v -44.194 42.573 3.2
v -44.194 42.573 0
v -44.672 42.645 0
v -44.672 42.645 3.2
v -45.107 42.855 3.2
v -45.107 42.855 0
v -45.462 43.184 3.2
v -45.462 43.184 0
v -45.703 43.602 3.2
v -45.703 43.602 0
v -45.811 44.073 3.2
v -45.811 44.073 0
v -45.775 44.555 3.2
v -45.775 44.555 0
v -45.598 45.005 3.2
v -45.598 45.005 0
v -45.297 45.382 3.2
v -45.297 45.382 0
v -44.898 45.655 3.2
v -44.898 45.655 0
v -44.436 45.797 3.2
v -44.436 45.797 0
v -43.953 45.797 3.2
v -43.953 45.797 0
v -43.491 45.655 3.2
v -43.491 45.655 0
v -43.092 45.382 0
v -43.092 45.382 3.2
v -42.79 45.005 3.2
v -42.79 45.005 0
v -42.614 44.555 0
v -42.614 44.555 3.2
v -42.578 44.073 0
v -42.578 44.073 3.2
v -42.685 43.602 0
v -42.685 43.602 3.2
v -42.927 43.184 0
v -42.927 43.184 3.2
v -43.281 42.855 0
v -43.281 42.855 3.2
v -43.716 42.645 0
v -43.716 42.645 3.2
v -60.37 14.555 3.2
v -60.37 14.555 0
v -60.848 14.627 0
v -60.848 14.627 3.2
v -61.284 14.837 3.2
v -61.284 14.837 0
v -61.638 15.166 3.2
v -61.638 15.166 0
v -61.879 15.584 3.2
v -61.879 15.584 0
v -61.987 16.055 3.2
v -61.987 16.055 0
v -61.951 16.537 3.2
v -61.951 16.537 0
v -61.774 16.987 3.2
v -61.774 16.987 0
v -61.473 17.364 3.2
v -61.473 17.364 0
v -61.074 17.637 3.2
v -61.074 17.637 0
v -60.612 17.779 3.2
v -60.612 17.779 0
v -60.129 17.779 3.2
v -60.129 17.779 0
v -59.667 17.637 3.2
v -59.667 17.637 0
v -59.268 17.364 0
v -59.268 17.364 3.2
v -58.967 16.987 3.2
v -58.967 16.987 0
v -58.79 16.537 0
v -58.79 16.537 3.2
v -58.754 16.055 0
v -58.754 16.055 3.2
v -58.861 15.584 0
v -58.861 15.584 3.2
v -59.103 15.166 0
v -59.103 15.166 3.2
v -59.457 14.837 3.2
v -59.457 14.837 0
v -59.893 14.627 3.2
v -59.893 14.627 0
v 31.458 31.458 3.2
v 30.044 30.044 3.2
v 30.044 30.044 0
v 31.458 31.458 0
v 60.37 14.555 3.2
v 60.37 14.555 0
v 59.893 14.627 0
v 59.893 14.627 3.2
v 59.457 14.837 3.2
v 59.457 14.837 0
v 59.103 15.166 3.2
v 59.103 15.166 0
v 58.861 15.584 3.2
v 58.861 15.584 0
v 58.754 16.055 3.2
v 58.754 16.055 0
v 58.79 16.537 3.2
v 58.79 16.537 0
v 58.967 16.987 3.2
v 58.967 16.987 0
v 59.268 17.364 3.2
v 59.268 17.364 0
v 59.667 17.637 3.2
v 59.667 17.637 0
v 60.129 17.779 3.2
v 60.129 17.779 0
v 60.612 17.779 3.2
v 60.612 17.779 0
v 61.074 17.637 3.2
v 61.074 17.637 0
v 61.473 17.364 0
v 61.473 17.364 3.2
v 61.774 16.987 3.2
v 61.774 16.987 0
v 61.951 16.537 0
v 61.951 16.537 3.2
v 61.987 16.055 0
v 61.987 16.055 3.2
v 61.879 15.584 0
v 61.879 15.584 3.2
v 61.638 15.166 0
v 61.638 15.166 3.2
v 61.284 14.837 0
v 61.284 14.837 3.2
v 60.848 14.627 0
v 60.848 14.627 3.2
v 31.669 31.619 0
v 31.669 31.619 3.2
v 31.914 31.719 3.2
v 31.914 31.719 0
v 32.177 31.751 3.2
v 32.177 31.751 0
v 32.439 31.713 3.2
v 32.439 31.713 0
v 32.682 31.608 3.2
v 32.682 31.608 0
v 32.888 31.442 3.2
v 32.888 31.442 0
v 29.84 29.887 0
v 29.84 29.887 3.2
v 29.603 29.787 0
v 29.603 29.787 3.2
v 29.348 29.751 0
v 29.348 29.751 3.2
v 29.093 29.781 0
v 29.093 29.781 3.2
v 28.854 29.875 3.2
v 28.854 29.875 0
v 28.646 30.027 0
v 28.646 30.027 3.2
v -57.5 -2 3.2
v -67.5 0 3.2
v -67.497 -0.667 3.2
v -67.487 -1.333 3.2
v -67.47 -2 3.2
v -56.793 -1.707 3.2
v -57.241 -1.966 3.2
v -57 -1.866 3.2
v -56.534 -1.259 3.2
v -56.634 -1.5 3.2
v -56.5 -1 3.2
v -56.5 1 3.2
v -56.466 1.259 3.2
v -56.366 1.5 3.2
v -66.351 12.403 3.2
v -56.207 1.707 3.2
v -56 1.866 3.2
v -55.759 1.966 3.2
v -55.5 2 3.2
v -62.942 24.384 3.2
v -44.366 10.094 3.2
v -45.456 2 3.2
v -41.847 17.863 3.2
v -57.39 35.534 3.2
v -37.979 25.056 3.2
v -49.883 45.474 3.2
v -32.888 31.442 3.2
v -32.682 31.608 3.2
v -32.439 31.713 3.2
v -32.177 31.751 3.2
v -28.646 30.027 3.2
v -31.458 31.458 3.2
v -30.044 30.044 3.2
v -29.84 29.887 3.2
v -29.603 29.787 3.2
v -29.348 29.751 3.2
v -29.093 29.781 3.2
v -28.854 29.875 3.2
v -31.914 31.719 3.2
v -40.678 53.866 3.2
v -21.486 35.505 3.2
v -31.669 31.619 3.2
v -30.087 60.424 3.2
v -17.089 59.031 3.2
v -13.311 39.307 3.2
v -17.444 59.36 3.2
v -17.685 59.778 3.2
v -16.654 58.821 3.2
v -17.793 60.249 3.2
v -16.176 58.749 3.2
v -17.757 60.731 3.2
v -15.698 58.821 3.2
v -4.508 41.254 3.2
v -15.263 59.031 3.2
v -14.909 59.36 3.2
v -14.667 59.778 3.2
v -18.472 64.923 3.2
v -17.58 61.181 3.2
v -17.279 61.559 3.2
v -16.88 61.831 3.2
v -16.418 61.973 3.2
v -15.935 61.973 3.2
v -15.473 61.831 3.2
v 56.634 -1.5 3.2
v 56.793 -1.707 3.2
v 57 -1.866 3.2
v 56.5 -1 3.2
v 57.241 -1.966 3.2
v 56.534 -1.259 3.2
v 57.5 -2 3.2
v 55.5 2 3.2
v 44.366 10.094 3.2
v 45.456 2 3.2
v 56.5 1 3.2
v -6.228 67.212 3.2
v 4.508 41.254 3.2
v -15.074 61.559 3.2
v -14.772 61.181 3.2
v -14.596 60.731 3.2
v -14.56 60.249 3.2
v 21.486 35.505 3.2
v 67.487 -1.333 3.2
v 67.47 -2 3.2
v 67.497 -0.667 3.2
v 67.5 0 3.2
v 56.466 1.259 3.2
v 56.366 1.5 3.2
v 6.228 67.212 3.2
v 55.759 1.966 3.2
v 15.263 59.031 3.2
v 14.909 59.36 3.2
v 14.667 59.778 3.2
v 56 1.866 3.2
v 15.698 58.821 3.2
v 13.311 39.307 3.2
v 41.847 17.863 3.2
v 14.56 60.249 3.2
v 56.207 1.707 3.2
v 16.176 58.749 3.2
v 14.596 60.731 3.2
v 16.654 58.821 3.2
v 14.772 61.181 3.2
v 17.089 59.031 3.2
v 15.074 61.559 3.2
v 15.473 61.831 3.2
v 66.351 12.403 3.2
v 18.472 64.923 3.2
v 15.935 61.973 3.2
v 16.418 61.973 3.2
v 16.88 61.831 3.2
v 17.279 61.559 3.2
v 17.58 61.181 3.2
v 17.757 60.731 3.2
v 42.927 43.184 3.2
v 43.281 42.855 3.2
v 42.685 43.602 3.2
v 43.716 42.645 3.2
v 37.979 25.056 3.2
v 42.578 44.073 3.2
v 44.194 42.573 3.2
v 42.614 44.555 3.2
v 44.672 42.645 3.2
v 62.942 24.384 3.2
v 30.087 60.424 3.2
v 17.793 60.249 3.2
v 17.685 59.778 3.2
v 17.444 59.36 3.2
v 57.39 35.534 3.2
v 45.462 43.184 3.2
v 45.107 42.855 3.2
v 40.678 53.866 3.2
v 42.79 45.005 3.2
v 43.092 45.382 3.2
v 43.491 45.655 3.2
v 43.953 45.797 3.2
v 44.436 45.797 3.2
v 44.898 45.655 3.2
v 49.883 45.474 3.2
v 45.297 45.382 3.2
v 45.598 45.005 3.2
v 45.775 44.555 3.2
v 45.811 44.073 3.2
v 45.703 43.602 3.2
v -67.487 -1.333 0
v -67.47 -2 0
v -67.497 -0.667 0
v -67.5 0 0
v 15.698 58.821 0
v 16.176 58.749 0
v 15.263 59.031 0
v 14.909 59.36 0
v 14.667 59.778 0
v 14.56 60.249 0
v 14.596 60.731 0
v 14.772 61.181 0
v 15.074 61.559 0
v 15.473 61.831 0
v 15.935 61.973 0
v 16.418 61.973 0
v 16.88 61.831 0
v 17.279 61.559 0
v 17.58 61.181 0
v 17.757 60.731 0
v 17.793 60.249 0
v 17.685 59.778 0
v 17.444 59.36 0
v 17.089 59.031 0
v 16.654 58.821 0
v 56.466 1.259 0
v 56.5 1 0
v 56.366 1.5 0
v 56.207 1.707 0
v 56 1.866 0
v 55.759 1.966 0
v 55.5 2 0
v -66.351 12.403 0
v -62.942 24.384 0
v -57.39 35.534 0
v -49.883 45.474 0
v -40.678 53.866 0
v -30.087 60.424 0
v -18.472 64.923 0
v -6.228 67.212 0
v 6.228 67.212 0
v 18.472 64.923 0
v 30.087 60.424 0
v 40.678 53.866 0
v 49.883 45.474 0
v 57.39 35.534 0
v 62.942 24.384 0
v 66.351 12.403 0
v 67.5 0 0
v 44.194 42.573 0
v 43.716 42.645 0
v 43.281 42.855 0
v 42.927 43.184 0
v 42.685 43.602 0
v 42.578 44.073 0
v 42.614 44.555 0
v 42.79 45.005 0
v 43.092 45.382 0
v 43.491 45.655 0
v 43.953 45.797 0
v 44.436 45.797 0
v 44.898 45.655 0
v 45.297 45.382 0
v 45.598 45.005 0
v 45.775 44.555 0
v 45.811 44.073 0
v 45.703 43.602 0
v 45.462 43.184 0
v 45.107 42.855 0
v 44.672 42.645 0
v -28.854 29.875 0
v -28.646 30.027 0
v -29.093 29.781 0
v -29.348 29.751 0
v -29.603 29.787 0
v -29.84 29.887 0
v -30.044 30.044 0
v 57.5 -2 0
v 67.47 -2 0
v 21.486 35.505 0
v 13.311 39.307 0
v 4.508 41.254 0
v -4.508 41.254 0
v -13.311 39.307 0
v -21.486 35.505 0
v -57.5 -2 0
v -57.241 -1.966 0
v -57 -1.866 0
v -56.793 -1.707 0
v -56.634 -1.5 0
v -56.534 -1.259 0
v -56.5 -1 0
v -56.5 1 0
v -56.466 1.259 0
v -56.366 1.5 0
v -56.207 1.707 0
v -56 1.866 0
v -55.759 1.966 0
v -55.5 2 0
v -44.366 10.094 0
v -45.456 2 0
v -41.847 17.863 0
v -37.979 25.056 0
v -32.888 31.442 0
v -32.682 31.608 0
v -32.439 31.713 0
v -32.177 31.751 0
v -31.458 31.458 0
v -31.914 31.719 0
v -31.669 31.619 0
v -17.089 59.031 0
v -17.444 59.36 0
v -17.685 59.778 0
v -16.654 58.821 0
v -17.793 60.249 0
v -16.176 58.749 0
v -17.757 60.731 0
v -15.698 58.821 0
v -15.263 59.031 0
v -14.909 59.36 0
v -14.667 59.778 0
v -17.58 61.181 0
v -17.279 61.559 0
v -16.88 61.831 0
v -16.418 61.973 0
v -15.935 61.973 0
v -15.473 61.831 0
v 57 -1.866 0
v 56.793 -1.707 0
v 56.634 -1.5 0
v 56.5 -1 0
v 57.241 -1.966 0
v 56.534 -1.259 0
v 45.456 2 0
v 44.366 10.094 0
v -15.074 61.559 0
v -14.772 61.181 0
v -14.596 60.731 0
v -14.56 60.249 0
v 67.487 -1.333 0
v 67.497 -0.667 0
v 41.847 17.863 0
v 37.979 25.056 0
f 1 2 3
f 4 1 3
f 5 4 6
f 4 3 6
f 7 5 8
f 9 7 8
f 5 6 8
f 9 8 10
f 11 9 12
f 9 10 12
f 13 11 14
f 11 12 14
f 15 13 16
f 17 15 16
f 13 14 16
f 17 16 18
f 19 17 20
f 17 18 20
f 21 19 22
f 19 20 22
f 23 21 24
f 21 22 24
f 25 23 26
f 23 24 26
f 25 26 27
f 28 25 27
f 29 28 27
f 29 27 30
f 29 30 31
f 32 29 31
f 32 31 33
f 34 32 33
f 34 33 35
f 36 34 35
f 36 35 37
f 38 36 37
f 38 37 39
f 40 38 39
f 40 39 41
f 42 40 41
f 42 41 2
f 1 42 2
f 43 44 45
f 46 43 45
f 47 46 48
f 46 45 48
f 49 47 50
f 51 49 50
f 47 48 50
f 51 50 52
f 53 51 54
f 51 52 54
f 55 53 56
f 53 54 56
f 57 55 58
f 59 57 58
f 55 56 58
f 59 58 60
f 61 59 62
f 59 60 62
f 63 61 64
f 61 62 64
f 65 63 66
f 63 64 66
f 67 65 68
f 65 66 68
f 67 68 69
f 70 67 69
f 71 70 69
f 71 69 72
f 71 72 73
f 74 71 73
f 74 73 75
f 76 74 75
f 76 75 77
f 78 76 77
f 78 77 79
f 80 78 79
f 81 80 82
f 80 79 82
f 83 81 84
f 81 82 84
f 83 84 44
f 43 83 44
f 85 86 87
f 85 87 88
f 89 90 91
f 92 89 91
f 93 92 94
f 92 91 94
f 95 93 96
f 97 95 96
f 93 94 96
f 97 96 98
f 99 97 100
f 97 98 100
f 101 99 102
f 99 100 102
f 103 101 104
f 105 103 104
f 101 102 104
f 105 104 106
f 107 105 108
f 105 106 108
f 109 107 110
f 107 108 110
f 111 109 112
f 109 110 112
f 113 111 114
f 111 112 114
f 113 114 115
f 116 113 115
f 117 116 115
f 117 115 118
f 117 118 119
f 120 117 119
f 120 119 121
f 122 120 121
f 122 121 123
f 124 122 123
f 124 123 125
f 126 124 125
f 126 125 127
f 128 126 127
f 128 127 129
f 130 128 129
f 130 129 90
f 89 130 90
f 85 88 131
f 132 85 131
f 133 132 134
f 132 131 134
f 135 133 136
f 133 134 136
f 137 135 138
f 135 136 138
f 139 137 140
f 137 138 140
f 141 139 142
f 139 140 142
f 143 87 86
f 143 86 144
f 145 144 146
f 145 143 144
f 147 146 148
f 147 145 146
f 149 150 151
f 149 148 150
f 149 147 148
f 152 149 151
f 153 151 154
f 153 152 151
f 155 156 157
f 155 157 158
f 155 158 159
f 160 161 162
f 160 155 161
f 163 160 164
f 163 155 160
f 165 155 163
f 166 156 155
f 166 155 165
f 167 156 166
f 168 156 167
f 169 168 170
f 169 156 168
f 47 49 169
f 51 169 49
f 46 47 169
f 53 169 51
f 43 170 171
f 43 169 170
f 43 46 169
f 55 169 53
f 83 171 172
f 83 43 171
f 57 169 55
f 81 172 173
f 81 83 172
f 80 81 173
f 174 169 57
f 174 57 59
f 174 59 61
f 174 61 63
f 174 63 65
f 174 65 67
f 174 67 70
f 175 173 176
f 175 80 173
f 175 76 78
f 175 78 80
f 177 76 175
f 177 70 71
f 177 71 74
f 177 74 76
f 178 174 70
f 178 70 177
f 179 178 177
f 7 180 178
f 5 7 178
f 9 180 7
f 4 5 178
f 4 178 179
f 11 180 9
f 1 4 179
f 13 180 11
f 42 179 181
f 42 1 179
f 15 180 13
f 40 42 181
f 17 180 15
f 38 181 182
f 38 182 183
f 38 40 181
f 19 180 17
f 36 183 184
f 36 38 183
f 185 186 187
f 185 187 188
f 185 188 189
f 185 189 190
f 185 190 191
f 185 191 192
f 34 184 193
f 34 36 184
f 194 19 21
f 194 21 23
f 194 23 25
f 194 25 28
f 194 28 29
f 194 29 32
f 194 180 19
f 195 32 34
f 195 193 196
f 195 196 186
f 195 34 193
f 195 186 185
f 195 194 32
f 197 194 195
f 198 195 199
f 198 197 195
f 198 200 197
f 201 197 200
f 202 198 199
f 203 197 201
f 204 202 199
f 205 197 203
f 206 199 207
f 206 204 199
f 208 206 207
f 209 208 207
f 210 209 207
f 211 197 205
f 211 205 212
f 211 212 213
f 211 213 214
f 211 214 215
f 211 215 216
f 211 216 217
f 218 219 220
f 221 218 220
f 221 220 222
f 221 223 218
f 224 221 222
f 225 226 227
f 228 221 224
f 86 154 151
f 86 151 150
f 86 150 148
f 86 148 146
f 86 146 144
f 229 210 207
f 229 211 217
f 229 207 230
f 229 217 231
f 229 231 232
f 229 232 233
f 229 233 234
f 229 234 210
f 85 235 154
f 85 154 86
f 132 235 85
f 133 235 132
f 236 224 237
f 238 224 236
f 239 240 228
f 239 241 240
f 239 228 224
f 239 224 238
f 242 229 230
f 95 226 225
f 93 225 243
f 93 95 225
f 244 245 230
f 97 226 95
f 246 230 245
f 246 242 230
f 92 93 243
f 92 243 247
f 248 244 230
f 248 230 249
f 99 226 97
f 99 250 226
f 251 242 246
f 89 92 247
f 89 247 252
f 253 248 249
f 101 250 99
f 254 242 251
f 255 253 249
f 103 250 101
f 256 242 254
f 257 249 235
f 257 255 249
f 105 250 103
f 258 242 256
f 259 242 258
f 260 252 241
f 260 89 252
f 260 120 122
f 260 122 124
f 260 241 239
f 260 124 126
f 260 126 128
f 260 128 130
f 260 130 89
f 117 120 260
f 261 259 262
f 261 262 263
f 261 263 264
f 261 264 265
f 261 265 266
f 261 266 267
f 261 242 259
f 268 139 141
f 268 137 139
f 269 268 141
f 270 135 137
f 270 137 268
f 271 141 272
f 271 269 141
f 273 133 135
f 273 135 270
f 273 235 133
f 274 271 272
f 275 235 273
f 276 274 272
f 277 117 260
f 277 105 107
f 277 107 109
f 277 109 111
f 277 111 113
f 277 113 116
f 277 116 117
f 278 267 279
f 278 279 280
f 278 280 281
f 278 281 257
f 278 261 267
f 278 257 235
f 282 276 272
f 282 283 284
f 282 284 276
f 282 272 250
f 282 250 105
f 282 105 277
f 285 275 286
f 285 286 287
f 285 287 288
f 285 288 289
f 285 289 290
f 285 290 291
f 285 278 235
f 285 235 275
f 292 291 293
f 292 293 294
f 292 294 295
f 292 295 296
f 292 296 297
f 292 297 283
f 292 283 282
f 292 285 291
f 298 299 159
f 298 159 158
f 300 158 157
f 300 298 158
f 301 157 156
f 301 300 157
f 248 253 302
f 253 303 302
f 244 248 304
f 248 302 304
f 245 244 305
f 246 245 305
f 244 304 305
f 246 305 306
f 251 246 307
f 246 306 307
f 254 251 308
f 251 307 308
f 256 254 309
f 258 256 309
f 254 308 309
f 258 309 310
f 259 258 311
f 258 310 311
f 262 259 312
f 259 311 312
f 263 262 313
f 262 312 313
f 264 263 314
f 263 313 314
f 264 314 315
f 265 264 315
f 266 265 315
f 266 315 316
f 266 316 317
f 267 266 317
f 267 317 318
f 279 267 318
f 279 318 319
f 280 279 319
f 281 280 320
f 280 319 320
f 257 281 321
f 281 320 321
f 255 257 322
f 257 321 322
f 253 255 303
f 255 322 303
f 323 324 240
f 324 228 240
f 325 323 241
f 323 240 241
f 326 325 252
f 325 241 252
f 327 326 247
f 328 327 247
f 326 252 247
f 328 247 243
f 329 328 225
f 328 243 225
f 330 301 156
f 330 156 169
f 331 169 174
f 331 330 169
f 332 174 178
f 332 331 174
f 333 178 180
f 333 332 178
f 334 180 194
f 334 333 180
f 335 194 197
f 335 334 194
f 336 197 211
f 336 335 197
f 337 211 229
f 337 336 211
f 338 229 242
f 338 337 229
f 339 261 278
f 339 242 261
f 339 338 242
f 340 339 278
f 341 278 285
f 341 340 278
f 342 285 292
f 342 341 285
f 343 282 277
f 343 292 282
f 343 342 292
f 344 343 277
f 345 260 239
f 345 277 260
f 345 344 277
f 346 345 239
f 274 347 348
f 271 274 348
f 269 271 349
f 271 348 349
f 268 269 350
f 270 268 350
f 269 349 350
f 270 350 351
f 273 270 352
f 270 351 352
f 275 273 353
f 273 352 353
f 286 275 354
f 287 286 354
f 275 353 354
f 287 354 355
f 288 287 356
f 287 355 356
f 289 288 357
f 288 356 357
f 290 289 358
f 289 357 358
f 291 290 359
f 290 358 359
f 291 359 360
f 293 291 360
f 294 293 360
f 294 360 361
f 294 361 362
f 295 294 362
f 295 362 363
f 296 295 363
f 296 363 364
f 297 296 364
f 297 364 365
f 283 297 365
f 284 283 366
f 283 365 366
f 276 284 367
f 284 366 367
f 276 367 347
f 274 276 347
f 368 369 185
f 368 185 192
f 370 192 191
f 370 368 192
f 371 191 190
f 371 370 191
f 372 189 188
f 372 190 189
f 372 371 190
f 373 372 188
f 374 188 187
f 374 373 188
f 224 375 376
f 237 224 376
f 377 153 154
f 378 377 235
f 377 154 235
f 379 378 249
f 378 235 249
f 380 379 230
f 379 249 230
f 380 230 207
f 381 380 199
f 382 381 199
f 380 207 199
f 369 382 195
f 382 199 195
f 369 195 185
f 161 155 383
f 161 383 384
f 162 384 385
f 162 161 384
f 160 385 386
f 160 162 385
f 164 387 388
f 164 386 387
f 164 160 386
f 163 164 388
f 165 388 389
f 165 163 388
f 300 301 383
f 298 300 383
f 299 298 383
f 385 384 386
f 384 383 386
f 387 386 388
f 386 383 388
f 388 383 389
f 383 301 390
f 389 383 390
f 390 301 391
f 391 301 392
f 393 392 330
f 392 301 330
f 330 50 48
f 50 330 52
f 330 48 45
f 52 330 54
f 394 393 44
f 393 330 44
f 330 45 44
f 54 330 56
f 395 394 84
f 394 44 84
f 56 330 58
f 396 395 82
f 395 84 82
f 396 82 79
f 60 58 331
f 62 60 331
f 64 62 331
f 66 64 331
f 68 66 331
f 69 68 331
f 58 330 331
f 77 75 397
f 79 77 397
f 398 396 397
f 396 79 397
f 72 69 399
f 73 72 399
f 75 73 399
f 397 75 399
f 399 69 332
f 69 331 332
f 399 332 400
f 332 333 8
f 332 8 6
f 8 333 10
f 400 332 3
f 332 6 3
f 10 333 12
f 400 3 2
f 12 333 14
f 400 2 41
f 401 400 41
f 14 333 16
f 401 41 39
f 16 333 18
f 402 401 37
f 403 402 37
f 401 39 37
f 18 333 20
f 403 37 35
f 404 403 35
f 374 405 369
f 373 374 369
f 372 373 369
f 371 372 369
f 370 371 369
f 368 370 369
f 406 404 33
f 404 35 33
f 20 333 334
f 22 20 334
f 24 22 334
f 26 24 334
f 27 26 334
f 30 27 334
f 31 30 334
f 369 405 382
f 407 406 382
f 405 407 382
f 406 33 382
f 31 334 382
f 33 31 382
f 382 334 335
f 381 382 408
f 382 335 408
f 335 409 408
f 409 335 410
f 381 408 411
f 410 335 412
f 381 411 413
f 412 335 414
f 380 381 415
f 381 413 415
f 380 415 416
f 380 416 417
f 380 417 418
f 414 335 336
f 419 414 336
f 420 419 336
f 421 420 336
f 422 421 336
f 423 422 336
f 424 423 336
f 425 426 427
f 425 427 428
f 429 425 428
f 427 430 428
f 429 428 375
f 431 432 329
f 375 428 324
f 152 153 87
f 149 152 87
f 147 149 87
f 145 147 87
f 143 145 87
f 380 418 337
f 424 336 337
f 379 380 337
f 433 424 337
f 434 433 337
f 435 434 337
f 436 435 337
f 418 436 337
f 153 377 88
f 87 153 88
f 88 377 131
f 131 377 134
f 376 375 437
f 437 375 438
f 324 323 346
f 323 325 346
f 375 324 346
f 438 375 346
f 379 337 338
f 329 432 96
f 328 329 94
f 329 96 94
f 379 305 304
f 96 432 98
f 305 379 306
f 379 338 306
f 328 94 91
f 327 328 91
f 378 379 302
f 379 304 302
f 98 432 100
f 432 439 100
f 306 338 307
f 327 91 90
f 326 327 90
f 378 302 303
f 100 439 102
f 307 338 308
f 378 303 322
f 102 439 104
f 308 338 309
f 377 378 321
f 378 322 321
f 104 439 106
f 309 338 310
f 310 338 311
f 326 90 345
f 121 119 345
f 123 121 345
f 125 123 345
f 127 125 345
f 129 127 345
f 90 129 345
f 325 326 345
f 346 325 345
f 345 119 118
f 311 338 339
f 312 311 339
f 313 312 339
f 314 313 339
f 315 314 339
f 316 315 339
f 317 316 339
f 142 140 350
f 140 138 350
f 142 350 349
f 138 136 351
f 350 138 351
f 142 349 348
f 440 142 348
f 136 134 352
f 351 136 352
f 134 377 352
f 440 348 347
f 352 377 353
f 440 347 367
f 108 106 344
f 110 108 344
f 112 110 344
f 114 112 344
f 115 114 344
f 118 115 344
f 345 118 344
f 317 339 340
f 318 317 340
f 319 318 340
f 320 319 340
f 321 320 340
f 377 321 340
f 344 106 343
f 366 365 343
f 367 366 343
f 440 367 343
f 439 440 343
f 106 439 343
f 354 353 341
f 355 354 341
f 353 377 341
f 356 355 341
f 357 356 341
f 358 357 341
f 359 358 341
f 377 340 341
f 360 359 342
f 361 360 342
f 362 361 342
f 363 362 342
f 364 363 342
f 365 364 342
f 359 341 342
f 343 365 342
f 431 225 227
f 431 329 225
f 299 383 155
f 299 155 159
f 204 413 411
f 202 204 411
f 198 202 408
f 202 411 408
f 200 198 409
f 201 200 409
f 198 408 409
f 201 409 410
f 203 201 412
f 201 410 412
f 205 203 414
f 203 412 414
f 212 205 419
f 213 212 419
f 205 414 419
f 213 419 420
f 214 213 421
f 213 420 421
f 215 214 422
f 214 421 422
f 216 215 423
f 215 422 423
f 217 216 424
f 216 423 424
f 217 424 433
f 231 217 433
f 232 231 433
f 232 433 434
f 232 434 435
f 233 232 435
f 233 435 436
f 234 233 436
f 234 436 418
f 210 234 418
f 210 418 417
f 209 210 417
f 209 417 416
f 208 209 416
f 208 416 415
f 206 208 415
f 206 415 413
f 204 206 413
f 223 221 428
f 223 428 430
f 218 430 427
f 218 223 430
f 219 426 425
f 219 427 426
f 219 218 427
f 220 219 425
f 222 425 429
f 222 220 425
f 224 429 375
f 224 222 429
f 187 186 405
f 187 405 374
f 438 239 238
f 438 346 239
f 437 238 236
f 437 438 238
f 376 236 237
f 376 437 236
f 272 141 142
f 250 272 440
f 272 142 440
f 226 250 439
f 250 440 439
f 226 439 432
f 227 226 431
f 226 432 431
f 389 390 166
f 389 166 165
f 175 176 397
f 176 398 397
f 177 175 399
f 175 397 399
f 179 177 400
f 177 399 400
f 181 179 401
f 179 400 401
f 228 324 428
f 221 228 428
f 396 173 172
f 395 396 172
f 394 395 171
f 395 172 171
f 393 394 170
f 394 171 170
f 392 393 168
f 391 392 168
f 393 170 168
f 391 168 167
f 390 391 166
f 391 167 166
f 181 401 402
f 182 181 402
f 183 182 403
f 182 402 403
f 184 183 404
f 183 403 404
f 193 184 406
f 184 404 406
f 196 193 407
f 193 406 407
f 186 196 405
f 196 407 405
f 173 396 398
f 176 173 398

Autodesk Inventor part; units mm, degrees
ref_plane "YZ Plane" through (0, 0, 0) normal (1, 0, 0) x (0, 1, 0)
ref_plane "XZ Plane" through (0, 0, 0) normal (0, 1, 0) x (-1, 0, 0)
ref_plane "XY Plane" through (0, 0, 0) normal (0, 0, 1) x (1, 0, 0)
sketch "スケッチ5" plane through (0, 0, 3.2) normal (0, 0, 1) x (1, 0, 0)
  circle A0 centre (-16.1762, 60.3704) radius 1.621 projected
  circle A1 centre (16.1762, 60.3704) radius 1.621 projected
  arc A2 (67.5, 0) -> (-67.5, 0) centre (0, 0) ccw projected
  circle A3 centre (-16.1762, 60.3704) radius 5
  circle A4 centre (16.1762, 60.3704) radius 5
  circle A5 centre (-44.1942, 44.1942) radius 1.621 projected
  circle A6 centre (-60.3704, 16.1762) radius 1.621 projected
  circle A7 centre (44.1942, 44.1942) radius 1.621 projected
  circle A8 centre (60.3704, 16.1762) radius 1.621 projected
  arc A9 (62.5, 0) -> (-62.5, 0) centre (0, 0) ccw
  circle A10 centre (-44.1942, 44.1942) radius 5
  circle A11 centre (-60.3704, 16.1762) radius 5
  circle A12 centre (44.1942, 44.1942) radius 5
  circle A13 centre (60.3704, 16.1762) radius 5
  line L0 (-45.5, 0) -> (-67.5, 0) projected
  line L1 (67.5, 0) -> (45.5, 0) projected
  point P0 (17.4703, 65.2)
  point P1 (-17.4703, 65.2)
  point P2 (58.8841, 20.9502)
  point P3 (65.2, 17.4703)
  point P4 (47.7297, 47.7297)
  point P5 (47.5855, 40.52)
  point P6 (40.52, 47.5855)
  point P7 (20.9502, 58.8841)
  point P8 (-65.2, 17.4703)
  point P9 (-58.8841, 20.9502)
  point P10 (-47.5855, 40.52)
  point P11 (-47.7297, 47.7297)
  point P12 (-40.52, 47.5855)
  point P13 (-20.9502, 58.8841)
  point P14 (-11.2987, 61.4702)
  point P15 (11.2987, 61.4702)
  point P16 (61.4702, 11.2987)
  point P17 (-61.4702, 11.2987)
sketch "スケッチ1" plane through (0, 0, 0) normal (0, 0, 1) x (1, 0, 0)
  arc A0 (45.456, 2) -> (-45.5, 0) centre (0, 0) ccw
  arc A1 (67.5, 0) -> (-67.5, 0) centre (0, 0) ccw
  arc A2 (67.4704, -2) -> (-67.4704, -2) centre (0, 0) ccw
  arc A3 (45.456, 2) -> (-45.456, 2) centre (0, 0) ccw
  line L0 (-56.5, 2) -> (-56.5, -2)
  line L1 (-56.5, 2) -> (-45.456, 2)
  line L2 (-56.5, -2) -> (-67.4704, -2)
  line L3 (0, 81.4) -> (0, -15.9)
  line L4 (56.5, 2) -> (56.5, -2)
  line L5 (56.5, 2) -> (45.456, 2)
  line L6 (56.5, -2) -> (67.4704, -2)
  line L7 (-45.5, 0) -> (0, 0)
  point P0 (44.5, 0)
  point P1 (45.5, 0)
  dimension "d0" = 91
  dimension "d1" = 135
  dimension "d58" = 11
  dimension "d61" = 2
  dimension "d62" = 2
extrude "プレート2" add sketch "スケッチ1" along normal blind 3.2 contours L1 L0 L2 A2 A1 L3 A0 | L3 A1 A2 L6 L4 L5 A0
sketch "スケッチ2" plane through (0, 0, 3.2) normal (0, 0, 1) x (1, 0, 0)
  circle A0 centre (0, 0) radius 62.5
  point P0 (16.1762, 60.3704)
  point P1 (-16.1762, 60.3704)
  point P2 (-44.1942, 44.1942)
  point P3 (-60.3704, 16.1762)
  point P4 (-60.3704, -16.1762)
  point P5 (-44.1942, -44.1942)
  point P6 (-16.1762, -60.3704)
  point P7 (16.1762, -60.3704)
  point P8 (44.1942, -44.1942)
  point P9 (60.3704, -16.1762)
  point P10 (60.3704, 16.1762)
  point P11 (44.1942, 44.1942)
  dimension "d8" = 125
  dimension "d11" = 360
  dimension "d49" = 0
hole "穴1" at (16.1762, 60.3704, 3.2) at (-16.1762, 60.3704, 3.2) at (-44.1942, 44.1942, 3.2) at (-60.3704, 16.1762, 3.2) at (-60.3704, -16.1762, 3.2) at (-44.1942, -44.1942, 3.2) at (-16.1762, -60.3704, 3.2) at (16.1762, -60.3704, 3.2) at (44.1942, -44.1942, 3.2) at (60.3704, -16.1762, 3.2) at (60.3704, 16.1762, 3.2) at (44.1942, 44.1942, 3.2) direction (0, 0, -1) diameter 3.242 end through all thread size "M4x0.7" class "6H" standard "ANSI Metric M Profile"
sketch "スケッチ6" plane through (0, 0, 3.2) normal (0, 0, 1) x (1, 0, 0)
  line L0 (-32.1734, 32.1734) -> (-29.3449, 29.3449)
  line L1 (29.3449, 29.3449) -> (32.1734, 32.1734)
  line L2 (0, 81.4) -> (0, -15.9) projected
  arc A0 (29.3449, 29.3449) -> (-29.3449, 29.3449) centre (0, 0) ccw
  arc A1 (45.456, 2) -> (-45.456, 2) centre (0, 0) ccw projected
  line L3 (-29.3449, 29.3449) -> (0, 0) construction
  line L4 (0, 0) -> (29.3449, 29.3449) construction
  point P0 (29.3449, 29.3449)
  dimension "d50" = 45
  dimension "d51" = 45
  dimension "d64" = 4
extrude "押し出し2" add sketch "スケッチ6" against normal up to surface (3.2 mm away)
fillet "コーナーR7" radius 1 4 edges at (-32.1734, 32.1734, 1.6) (-29.3449, 29.3449, 1.6) (32.1734, 32.1734, 1.6) (29.3449, 29.3449, 1.6)
fillet "コーナーR8" radius 1 4 edges at (-56.5, 2, 1.6) (56.5, 2, 1.6) (-56.5, -2, 1.6) (56.5, -2, 1.6)
equation "\"d18\" = Thickness"
equation "\"d6\" = Thickness"
equation "\"BendRadius\" = Thickness"
equation "\"BendReliefWidth\" = Thickness"
equation "\"BendReliefDepth\" = 0.5 * Thickness"
equation "\"CornerReliefSize\" = 4 * Thickness"
equation "\"MinimumRemnant\" = 2 * Thickness"
equation "\"TransitionRadius\" = BendRadius"
equation "\"JacobiRadiusSize\" = BendRadius"
equation "\"GapSize\" = Thickness"
equation "\"Thickness\" = 3.2"
properties part number "plate1" material "鋼、炭素鋼"
